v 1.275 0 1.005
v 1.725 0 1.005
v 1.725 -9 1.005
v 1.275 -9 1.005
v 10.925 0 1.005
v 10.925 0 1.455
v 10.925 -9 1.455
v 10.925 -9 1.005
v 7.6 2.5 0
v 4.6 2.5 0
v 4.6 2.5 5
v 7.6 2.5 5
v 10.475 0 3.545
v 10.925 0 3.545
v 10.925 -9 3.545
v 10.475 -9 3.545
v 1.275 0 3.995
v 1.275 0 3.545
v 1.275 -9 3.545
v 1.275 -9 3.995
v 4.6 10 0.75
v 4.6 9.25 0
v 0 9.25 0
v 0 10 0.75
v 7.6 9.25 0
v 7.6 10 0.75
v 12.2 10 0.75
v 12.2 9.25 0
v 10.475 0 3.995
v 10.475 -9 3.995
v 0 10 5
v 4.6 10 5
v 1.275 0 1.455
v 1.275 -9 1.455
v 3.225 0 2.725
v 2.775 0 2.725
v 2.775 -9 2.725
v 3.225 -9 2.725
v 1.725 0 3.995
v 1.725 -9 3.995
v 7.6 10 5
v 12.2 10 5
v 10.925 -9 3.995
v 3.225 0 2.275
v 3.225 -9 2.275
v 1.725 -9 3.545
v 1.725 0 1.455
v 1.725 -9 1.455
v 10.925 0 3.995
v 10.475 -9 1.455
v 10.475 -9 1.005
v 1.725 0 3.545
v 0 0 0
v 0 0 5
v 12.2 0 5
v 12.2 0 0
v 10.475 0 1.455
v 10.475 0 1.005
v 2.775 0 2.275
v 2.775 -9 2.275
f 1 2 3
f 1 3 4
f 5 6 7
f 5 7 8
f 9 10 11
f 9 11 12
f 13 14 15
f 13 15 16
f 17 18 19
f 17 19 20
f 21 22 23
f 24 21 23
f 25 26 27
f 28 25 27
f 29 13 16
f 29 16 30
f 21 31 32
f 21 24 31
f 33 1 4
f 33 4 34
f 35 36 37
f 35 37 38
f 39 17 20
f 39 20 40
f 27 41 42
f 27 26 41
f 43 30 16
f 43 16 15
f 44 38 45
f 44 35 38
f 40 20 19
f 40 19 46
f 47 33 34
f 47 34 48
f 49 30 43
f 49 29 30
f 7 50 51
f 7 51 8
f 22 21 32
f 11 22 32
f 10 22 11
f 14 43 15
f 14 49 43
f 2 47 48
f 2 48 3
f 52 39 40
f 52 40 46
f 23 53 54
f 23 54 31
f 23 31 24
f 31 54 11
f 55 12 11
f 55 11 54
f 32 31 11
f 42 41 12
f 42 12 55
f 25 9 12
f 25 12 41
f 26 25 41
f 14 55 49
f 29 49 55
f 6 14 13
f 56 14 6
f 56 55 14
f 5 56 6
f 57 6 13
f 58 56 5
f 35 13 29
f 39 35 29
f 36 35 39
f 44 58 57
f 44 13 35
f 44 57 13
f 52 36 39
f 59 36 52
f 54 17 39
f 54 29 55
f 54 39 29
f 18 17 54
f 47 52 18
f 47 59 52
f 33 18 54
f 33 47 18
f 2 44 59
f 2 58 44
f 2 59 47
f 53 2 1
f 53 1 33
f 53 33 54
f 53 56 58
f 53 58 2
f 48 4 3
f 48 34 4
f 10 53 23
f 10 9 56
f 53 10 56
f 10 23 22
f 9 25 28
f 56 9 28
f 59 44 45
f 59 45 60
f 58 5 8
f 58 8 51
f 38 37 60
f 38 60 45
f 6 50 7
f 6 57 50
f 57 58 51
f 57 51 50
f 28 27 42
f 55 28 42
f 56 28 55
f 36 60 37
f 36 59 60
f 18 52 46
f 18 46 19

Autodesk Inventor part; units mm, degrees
ref_plane "YZ Plane" through (0, 0, 0) normal (1, 0, 0) x (0, 1, 0)
ref_plane "XZ Plane" through (0, 0, 0) normal (0, 1, 0) x (-1, 0, 0)
ref_plane "XY Plane" through (0, 0, 0) normal (0, 0, 1) x (1, 0, 0)
sketch "Sketch1" plane through (0, 0, 0) normal (0, 0, 1) x (1, 0, 0)
  line L0 (0, 0) -> (0, 10)
  line L1 (0, 10) -> (4.6, 10)
  line L2 (4.6, 10) -> (4.6, 2.5)
  line L3 (4.6, 2.5) -> (7.6, 2.5)
  line L4 (7.6, 2.5) -> (7.6, 10)
  line L5 (7.6, 10) -> (12.2, 10)
  line L6 (12.2, 10) -> (12.2, 0)
  line L7 (12.2, 0) -> (0, 0)
  dimension "d0" = 12.2
  dimension "d1" = 10
  dimension "d2" = 7.5
  dimension "d3" = 3
extrude "Extrusion1" add sketch "Sketch1" along normal blind 5
sketch "Sketch2" plane through (0, 0, 0) normal (0, -1, 0) x (1, 0, 0)
  line L0 (0, 0) -> (0, 5) projected
  line L1 (1.5, 3.77) -> (10.7, 3.77) construction
  line L2 (0, 5) -> (12.2, 5) construction
  line L3 (1.275, 3.995) -> (1.725, 3.995)
  line L4 (1.725, 3.995) -> (1.725, 3.545)
  line L5 (1.725, 3.545) -> (1.275, 3.545)
  line L6 (1.275, 3.545) -> (1.275, 3.995)
  line L7 (1.275, 3.995) -> (1.725, 3.545) construction
  line L8 (1.725, 3.995) -> (1.275, 3.545) construction
  point P0 (1.5, 1.23)
  point P1 (3, 2.5)
  point P2 (10.7, 1.23)
  point P3 (0, 2.5)
  point P4 (6.1, 3.77)
  point P5 (6.1, 5)
  dimension "d6" = 1.27
  dimension "d7" = 1.27
  dimension "d8" = 1.5
  dimension "d9" = 9.2
  dimension "d10" = 0.45
  dimension "d11" = 0.45
extrude "Extrusion2" add sketch "Sketch2" along normal blind 9
pattern_sketch "Sketch Driven Pattern1" of "Extrusion2" from (1.5, 0, 3.77) copies at (1.5, 0, 1.23) at (3, 0, 2.5) at (10.7, 0, 3.77) at (10.7, 0, 1.23)
chamfer "Chamfer1" distance 0.75 angle 45 2 edges at (9.9, 10, 0) (2.3, 10, 0)
properties part number "GP1A52HRJ00F (Large slot detector)"
